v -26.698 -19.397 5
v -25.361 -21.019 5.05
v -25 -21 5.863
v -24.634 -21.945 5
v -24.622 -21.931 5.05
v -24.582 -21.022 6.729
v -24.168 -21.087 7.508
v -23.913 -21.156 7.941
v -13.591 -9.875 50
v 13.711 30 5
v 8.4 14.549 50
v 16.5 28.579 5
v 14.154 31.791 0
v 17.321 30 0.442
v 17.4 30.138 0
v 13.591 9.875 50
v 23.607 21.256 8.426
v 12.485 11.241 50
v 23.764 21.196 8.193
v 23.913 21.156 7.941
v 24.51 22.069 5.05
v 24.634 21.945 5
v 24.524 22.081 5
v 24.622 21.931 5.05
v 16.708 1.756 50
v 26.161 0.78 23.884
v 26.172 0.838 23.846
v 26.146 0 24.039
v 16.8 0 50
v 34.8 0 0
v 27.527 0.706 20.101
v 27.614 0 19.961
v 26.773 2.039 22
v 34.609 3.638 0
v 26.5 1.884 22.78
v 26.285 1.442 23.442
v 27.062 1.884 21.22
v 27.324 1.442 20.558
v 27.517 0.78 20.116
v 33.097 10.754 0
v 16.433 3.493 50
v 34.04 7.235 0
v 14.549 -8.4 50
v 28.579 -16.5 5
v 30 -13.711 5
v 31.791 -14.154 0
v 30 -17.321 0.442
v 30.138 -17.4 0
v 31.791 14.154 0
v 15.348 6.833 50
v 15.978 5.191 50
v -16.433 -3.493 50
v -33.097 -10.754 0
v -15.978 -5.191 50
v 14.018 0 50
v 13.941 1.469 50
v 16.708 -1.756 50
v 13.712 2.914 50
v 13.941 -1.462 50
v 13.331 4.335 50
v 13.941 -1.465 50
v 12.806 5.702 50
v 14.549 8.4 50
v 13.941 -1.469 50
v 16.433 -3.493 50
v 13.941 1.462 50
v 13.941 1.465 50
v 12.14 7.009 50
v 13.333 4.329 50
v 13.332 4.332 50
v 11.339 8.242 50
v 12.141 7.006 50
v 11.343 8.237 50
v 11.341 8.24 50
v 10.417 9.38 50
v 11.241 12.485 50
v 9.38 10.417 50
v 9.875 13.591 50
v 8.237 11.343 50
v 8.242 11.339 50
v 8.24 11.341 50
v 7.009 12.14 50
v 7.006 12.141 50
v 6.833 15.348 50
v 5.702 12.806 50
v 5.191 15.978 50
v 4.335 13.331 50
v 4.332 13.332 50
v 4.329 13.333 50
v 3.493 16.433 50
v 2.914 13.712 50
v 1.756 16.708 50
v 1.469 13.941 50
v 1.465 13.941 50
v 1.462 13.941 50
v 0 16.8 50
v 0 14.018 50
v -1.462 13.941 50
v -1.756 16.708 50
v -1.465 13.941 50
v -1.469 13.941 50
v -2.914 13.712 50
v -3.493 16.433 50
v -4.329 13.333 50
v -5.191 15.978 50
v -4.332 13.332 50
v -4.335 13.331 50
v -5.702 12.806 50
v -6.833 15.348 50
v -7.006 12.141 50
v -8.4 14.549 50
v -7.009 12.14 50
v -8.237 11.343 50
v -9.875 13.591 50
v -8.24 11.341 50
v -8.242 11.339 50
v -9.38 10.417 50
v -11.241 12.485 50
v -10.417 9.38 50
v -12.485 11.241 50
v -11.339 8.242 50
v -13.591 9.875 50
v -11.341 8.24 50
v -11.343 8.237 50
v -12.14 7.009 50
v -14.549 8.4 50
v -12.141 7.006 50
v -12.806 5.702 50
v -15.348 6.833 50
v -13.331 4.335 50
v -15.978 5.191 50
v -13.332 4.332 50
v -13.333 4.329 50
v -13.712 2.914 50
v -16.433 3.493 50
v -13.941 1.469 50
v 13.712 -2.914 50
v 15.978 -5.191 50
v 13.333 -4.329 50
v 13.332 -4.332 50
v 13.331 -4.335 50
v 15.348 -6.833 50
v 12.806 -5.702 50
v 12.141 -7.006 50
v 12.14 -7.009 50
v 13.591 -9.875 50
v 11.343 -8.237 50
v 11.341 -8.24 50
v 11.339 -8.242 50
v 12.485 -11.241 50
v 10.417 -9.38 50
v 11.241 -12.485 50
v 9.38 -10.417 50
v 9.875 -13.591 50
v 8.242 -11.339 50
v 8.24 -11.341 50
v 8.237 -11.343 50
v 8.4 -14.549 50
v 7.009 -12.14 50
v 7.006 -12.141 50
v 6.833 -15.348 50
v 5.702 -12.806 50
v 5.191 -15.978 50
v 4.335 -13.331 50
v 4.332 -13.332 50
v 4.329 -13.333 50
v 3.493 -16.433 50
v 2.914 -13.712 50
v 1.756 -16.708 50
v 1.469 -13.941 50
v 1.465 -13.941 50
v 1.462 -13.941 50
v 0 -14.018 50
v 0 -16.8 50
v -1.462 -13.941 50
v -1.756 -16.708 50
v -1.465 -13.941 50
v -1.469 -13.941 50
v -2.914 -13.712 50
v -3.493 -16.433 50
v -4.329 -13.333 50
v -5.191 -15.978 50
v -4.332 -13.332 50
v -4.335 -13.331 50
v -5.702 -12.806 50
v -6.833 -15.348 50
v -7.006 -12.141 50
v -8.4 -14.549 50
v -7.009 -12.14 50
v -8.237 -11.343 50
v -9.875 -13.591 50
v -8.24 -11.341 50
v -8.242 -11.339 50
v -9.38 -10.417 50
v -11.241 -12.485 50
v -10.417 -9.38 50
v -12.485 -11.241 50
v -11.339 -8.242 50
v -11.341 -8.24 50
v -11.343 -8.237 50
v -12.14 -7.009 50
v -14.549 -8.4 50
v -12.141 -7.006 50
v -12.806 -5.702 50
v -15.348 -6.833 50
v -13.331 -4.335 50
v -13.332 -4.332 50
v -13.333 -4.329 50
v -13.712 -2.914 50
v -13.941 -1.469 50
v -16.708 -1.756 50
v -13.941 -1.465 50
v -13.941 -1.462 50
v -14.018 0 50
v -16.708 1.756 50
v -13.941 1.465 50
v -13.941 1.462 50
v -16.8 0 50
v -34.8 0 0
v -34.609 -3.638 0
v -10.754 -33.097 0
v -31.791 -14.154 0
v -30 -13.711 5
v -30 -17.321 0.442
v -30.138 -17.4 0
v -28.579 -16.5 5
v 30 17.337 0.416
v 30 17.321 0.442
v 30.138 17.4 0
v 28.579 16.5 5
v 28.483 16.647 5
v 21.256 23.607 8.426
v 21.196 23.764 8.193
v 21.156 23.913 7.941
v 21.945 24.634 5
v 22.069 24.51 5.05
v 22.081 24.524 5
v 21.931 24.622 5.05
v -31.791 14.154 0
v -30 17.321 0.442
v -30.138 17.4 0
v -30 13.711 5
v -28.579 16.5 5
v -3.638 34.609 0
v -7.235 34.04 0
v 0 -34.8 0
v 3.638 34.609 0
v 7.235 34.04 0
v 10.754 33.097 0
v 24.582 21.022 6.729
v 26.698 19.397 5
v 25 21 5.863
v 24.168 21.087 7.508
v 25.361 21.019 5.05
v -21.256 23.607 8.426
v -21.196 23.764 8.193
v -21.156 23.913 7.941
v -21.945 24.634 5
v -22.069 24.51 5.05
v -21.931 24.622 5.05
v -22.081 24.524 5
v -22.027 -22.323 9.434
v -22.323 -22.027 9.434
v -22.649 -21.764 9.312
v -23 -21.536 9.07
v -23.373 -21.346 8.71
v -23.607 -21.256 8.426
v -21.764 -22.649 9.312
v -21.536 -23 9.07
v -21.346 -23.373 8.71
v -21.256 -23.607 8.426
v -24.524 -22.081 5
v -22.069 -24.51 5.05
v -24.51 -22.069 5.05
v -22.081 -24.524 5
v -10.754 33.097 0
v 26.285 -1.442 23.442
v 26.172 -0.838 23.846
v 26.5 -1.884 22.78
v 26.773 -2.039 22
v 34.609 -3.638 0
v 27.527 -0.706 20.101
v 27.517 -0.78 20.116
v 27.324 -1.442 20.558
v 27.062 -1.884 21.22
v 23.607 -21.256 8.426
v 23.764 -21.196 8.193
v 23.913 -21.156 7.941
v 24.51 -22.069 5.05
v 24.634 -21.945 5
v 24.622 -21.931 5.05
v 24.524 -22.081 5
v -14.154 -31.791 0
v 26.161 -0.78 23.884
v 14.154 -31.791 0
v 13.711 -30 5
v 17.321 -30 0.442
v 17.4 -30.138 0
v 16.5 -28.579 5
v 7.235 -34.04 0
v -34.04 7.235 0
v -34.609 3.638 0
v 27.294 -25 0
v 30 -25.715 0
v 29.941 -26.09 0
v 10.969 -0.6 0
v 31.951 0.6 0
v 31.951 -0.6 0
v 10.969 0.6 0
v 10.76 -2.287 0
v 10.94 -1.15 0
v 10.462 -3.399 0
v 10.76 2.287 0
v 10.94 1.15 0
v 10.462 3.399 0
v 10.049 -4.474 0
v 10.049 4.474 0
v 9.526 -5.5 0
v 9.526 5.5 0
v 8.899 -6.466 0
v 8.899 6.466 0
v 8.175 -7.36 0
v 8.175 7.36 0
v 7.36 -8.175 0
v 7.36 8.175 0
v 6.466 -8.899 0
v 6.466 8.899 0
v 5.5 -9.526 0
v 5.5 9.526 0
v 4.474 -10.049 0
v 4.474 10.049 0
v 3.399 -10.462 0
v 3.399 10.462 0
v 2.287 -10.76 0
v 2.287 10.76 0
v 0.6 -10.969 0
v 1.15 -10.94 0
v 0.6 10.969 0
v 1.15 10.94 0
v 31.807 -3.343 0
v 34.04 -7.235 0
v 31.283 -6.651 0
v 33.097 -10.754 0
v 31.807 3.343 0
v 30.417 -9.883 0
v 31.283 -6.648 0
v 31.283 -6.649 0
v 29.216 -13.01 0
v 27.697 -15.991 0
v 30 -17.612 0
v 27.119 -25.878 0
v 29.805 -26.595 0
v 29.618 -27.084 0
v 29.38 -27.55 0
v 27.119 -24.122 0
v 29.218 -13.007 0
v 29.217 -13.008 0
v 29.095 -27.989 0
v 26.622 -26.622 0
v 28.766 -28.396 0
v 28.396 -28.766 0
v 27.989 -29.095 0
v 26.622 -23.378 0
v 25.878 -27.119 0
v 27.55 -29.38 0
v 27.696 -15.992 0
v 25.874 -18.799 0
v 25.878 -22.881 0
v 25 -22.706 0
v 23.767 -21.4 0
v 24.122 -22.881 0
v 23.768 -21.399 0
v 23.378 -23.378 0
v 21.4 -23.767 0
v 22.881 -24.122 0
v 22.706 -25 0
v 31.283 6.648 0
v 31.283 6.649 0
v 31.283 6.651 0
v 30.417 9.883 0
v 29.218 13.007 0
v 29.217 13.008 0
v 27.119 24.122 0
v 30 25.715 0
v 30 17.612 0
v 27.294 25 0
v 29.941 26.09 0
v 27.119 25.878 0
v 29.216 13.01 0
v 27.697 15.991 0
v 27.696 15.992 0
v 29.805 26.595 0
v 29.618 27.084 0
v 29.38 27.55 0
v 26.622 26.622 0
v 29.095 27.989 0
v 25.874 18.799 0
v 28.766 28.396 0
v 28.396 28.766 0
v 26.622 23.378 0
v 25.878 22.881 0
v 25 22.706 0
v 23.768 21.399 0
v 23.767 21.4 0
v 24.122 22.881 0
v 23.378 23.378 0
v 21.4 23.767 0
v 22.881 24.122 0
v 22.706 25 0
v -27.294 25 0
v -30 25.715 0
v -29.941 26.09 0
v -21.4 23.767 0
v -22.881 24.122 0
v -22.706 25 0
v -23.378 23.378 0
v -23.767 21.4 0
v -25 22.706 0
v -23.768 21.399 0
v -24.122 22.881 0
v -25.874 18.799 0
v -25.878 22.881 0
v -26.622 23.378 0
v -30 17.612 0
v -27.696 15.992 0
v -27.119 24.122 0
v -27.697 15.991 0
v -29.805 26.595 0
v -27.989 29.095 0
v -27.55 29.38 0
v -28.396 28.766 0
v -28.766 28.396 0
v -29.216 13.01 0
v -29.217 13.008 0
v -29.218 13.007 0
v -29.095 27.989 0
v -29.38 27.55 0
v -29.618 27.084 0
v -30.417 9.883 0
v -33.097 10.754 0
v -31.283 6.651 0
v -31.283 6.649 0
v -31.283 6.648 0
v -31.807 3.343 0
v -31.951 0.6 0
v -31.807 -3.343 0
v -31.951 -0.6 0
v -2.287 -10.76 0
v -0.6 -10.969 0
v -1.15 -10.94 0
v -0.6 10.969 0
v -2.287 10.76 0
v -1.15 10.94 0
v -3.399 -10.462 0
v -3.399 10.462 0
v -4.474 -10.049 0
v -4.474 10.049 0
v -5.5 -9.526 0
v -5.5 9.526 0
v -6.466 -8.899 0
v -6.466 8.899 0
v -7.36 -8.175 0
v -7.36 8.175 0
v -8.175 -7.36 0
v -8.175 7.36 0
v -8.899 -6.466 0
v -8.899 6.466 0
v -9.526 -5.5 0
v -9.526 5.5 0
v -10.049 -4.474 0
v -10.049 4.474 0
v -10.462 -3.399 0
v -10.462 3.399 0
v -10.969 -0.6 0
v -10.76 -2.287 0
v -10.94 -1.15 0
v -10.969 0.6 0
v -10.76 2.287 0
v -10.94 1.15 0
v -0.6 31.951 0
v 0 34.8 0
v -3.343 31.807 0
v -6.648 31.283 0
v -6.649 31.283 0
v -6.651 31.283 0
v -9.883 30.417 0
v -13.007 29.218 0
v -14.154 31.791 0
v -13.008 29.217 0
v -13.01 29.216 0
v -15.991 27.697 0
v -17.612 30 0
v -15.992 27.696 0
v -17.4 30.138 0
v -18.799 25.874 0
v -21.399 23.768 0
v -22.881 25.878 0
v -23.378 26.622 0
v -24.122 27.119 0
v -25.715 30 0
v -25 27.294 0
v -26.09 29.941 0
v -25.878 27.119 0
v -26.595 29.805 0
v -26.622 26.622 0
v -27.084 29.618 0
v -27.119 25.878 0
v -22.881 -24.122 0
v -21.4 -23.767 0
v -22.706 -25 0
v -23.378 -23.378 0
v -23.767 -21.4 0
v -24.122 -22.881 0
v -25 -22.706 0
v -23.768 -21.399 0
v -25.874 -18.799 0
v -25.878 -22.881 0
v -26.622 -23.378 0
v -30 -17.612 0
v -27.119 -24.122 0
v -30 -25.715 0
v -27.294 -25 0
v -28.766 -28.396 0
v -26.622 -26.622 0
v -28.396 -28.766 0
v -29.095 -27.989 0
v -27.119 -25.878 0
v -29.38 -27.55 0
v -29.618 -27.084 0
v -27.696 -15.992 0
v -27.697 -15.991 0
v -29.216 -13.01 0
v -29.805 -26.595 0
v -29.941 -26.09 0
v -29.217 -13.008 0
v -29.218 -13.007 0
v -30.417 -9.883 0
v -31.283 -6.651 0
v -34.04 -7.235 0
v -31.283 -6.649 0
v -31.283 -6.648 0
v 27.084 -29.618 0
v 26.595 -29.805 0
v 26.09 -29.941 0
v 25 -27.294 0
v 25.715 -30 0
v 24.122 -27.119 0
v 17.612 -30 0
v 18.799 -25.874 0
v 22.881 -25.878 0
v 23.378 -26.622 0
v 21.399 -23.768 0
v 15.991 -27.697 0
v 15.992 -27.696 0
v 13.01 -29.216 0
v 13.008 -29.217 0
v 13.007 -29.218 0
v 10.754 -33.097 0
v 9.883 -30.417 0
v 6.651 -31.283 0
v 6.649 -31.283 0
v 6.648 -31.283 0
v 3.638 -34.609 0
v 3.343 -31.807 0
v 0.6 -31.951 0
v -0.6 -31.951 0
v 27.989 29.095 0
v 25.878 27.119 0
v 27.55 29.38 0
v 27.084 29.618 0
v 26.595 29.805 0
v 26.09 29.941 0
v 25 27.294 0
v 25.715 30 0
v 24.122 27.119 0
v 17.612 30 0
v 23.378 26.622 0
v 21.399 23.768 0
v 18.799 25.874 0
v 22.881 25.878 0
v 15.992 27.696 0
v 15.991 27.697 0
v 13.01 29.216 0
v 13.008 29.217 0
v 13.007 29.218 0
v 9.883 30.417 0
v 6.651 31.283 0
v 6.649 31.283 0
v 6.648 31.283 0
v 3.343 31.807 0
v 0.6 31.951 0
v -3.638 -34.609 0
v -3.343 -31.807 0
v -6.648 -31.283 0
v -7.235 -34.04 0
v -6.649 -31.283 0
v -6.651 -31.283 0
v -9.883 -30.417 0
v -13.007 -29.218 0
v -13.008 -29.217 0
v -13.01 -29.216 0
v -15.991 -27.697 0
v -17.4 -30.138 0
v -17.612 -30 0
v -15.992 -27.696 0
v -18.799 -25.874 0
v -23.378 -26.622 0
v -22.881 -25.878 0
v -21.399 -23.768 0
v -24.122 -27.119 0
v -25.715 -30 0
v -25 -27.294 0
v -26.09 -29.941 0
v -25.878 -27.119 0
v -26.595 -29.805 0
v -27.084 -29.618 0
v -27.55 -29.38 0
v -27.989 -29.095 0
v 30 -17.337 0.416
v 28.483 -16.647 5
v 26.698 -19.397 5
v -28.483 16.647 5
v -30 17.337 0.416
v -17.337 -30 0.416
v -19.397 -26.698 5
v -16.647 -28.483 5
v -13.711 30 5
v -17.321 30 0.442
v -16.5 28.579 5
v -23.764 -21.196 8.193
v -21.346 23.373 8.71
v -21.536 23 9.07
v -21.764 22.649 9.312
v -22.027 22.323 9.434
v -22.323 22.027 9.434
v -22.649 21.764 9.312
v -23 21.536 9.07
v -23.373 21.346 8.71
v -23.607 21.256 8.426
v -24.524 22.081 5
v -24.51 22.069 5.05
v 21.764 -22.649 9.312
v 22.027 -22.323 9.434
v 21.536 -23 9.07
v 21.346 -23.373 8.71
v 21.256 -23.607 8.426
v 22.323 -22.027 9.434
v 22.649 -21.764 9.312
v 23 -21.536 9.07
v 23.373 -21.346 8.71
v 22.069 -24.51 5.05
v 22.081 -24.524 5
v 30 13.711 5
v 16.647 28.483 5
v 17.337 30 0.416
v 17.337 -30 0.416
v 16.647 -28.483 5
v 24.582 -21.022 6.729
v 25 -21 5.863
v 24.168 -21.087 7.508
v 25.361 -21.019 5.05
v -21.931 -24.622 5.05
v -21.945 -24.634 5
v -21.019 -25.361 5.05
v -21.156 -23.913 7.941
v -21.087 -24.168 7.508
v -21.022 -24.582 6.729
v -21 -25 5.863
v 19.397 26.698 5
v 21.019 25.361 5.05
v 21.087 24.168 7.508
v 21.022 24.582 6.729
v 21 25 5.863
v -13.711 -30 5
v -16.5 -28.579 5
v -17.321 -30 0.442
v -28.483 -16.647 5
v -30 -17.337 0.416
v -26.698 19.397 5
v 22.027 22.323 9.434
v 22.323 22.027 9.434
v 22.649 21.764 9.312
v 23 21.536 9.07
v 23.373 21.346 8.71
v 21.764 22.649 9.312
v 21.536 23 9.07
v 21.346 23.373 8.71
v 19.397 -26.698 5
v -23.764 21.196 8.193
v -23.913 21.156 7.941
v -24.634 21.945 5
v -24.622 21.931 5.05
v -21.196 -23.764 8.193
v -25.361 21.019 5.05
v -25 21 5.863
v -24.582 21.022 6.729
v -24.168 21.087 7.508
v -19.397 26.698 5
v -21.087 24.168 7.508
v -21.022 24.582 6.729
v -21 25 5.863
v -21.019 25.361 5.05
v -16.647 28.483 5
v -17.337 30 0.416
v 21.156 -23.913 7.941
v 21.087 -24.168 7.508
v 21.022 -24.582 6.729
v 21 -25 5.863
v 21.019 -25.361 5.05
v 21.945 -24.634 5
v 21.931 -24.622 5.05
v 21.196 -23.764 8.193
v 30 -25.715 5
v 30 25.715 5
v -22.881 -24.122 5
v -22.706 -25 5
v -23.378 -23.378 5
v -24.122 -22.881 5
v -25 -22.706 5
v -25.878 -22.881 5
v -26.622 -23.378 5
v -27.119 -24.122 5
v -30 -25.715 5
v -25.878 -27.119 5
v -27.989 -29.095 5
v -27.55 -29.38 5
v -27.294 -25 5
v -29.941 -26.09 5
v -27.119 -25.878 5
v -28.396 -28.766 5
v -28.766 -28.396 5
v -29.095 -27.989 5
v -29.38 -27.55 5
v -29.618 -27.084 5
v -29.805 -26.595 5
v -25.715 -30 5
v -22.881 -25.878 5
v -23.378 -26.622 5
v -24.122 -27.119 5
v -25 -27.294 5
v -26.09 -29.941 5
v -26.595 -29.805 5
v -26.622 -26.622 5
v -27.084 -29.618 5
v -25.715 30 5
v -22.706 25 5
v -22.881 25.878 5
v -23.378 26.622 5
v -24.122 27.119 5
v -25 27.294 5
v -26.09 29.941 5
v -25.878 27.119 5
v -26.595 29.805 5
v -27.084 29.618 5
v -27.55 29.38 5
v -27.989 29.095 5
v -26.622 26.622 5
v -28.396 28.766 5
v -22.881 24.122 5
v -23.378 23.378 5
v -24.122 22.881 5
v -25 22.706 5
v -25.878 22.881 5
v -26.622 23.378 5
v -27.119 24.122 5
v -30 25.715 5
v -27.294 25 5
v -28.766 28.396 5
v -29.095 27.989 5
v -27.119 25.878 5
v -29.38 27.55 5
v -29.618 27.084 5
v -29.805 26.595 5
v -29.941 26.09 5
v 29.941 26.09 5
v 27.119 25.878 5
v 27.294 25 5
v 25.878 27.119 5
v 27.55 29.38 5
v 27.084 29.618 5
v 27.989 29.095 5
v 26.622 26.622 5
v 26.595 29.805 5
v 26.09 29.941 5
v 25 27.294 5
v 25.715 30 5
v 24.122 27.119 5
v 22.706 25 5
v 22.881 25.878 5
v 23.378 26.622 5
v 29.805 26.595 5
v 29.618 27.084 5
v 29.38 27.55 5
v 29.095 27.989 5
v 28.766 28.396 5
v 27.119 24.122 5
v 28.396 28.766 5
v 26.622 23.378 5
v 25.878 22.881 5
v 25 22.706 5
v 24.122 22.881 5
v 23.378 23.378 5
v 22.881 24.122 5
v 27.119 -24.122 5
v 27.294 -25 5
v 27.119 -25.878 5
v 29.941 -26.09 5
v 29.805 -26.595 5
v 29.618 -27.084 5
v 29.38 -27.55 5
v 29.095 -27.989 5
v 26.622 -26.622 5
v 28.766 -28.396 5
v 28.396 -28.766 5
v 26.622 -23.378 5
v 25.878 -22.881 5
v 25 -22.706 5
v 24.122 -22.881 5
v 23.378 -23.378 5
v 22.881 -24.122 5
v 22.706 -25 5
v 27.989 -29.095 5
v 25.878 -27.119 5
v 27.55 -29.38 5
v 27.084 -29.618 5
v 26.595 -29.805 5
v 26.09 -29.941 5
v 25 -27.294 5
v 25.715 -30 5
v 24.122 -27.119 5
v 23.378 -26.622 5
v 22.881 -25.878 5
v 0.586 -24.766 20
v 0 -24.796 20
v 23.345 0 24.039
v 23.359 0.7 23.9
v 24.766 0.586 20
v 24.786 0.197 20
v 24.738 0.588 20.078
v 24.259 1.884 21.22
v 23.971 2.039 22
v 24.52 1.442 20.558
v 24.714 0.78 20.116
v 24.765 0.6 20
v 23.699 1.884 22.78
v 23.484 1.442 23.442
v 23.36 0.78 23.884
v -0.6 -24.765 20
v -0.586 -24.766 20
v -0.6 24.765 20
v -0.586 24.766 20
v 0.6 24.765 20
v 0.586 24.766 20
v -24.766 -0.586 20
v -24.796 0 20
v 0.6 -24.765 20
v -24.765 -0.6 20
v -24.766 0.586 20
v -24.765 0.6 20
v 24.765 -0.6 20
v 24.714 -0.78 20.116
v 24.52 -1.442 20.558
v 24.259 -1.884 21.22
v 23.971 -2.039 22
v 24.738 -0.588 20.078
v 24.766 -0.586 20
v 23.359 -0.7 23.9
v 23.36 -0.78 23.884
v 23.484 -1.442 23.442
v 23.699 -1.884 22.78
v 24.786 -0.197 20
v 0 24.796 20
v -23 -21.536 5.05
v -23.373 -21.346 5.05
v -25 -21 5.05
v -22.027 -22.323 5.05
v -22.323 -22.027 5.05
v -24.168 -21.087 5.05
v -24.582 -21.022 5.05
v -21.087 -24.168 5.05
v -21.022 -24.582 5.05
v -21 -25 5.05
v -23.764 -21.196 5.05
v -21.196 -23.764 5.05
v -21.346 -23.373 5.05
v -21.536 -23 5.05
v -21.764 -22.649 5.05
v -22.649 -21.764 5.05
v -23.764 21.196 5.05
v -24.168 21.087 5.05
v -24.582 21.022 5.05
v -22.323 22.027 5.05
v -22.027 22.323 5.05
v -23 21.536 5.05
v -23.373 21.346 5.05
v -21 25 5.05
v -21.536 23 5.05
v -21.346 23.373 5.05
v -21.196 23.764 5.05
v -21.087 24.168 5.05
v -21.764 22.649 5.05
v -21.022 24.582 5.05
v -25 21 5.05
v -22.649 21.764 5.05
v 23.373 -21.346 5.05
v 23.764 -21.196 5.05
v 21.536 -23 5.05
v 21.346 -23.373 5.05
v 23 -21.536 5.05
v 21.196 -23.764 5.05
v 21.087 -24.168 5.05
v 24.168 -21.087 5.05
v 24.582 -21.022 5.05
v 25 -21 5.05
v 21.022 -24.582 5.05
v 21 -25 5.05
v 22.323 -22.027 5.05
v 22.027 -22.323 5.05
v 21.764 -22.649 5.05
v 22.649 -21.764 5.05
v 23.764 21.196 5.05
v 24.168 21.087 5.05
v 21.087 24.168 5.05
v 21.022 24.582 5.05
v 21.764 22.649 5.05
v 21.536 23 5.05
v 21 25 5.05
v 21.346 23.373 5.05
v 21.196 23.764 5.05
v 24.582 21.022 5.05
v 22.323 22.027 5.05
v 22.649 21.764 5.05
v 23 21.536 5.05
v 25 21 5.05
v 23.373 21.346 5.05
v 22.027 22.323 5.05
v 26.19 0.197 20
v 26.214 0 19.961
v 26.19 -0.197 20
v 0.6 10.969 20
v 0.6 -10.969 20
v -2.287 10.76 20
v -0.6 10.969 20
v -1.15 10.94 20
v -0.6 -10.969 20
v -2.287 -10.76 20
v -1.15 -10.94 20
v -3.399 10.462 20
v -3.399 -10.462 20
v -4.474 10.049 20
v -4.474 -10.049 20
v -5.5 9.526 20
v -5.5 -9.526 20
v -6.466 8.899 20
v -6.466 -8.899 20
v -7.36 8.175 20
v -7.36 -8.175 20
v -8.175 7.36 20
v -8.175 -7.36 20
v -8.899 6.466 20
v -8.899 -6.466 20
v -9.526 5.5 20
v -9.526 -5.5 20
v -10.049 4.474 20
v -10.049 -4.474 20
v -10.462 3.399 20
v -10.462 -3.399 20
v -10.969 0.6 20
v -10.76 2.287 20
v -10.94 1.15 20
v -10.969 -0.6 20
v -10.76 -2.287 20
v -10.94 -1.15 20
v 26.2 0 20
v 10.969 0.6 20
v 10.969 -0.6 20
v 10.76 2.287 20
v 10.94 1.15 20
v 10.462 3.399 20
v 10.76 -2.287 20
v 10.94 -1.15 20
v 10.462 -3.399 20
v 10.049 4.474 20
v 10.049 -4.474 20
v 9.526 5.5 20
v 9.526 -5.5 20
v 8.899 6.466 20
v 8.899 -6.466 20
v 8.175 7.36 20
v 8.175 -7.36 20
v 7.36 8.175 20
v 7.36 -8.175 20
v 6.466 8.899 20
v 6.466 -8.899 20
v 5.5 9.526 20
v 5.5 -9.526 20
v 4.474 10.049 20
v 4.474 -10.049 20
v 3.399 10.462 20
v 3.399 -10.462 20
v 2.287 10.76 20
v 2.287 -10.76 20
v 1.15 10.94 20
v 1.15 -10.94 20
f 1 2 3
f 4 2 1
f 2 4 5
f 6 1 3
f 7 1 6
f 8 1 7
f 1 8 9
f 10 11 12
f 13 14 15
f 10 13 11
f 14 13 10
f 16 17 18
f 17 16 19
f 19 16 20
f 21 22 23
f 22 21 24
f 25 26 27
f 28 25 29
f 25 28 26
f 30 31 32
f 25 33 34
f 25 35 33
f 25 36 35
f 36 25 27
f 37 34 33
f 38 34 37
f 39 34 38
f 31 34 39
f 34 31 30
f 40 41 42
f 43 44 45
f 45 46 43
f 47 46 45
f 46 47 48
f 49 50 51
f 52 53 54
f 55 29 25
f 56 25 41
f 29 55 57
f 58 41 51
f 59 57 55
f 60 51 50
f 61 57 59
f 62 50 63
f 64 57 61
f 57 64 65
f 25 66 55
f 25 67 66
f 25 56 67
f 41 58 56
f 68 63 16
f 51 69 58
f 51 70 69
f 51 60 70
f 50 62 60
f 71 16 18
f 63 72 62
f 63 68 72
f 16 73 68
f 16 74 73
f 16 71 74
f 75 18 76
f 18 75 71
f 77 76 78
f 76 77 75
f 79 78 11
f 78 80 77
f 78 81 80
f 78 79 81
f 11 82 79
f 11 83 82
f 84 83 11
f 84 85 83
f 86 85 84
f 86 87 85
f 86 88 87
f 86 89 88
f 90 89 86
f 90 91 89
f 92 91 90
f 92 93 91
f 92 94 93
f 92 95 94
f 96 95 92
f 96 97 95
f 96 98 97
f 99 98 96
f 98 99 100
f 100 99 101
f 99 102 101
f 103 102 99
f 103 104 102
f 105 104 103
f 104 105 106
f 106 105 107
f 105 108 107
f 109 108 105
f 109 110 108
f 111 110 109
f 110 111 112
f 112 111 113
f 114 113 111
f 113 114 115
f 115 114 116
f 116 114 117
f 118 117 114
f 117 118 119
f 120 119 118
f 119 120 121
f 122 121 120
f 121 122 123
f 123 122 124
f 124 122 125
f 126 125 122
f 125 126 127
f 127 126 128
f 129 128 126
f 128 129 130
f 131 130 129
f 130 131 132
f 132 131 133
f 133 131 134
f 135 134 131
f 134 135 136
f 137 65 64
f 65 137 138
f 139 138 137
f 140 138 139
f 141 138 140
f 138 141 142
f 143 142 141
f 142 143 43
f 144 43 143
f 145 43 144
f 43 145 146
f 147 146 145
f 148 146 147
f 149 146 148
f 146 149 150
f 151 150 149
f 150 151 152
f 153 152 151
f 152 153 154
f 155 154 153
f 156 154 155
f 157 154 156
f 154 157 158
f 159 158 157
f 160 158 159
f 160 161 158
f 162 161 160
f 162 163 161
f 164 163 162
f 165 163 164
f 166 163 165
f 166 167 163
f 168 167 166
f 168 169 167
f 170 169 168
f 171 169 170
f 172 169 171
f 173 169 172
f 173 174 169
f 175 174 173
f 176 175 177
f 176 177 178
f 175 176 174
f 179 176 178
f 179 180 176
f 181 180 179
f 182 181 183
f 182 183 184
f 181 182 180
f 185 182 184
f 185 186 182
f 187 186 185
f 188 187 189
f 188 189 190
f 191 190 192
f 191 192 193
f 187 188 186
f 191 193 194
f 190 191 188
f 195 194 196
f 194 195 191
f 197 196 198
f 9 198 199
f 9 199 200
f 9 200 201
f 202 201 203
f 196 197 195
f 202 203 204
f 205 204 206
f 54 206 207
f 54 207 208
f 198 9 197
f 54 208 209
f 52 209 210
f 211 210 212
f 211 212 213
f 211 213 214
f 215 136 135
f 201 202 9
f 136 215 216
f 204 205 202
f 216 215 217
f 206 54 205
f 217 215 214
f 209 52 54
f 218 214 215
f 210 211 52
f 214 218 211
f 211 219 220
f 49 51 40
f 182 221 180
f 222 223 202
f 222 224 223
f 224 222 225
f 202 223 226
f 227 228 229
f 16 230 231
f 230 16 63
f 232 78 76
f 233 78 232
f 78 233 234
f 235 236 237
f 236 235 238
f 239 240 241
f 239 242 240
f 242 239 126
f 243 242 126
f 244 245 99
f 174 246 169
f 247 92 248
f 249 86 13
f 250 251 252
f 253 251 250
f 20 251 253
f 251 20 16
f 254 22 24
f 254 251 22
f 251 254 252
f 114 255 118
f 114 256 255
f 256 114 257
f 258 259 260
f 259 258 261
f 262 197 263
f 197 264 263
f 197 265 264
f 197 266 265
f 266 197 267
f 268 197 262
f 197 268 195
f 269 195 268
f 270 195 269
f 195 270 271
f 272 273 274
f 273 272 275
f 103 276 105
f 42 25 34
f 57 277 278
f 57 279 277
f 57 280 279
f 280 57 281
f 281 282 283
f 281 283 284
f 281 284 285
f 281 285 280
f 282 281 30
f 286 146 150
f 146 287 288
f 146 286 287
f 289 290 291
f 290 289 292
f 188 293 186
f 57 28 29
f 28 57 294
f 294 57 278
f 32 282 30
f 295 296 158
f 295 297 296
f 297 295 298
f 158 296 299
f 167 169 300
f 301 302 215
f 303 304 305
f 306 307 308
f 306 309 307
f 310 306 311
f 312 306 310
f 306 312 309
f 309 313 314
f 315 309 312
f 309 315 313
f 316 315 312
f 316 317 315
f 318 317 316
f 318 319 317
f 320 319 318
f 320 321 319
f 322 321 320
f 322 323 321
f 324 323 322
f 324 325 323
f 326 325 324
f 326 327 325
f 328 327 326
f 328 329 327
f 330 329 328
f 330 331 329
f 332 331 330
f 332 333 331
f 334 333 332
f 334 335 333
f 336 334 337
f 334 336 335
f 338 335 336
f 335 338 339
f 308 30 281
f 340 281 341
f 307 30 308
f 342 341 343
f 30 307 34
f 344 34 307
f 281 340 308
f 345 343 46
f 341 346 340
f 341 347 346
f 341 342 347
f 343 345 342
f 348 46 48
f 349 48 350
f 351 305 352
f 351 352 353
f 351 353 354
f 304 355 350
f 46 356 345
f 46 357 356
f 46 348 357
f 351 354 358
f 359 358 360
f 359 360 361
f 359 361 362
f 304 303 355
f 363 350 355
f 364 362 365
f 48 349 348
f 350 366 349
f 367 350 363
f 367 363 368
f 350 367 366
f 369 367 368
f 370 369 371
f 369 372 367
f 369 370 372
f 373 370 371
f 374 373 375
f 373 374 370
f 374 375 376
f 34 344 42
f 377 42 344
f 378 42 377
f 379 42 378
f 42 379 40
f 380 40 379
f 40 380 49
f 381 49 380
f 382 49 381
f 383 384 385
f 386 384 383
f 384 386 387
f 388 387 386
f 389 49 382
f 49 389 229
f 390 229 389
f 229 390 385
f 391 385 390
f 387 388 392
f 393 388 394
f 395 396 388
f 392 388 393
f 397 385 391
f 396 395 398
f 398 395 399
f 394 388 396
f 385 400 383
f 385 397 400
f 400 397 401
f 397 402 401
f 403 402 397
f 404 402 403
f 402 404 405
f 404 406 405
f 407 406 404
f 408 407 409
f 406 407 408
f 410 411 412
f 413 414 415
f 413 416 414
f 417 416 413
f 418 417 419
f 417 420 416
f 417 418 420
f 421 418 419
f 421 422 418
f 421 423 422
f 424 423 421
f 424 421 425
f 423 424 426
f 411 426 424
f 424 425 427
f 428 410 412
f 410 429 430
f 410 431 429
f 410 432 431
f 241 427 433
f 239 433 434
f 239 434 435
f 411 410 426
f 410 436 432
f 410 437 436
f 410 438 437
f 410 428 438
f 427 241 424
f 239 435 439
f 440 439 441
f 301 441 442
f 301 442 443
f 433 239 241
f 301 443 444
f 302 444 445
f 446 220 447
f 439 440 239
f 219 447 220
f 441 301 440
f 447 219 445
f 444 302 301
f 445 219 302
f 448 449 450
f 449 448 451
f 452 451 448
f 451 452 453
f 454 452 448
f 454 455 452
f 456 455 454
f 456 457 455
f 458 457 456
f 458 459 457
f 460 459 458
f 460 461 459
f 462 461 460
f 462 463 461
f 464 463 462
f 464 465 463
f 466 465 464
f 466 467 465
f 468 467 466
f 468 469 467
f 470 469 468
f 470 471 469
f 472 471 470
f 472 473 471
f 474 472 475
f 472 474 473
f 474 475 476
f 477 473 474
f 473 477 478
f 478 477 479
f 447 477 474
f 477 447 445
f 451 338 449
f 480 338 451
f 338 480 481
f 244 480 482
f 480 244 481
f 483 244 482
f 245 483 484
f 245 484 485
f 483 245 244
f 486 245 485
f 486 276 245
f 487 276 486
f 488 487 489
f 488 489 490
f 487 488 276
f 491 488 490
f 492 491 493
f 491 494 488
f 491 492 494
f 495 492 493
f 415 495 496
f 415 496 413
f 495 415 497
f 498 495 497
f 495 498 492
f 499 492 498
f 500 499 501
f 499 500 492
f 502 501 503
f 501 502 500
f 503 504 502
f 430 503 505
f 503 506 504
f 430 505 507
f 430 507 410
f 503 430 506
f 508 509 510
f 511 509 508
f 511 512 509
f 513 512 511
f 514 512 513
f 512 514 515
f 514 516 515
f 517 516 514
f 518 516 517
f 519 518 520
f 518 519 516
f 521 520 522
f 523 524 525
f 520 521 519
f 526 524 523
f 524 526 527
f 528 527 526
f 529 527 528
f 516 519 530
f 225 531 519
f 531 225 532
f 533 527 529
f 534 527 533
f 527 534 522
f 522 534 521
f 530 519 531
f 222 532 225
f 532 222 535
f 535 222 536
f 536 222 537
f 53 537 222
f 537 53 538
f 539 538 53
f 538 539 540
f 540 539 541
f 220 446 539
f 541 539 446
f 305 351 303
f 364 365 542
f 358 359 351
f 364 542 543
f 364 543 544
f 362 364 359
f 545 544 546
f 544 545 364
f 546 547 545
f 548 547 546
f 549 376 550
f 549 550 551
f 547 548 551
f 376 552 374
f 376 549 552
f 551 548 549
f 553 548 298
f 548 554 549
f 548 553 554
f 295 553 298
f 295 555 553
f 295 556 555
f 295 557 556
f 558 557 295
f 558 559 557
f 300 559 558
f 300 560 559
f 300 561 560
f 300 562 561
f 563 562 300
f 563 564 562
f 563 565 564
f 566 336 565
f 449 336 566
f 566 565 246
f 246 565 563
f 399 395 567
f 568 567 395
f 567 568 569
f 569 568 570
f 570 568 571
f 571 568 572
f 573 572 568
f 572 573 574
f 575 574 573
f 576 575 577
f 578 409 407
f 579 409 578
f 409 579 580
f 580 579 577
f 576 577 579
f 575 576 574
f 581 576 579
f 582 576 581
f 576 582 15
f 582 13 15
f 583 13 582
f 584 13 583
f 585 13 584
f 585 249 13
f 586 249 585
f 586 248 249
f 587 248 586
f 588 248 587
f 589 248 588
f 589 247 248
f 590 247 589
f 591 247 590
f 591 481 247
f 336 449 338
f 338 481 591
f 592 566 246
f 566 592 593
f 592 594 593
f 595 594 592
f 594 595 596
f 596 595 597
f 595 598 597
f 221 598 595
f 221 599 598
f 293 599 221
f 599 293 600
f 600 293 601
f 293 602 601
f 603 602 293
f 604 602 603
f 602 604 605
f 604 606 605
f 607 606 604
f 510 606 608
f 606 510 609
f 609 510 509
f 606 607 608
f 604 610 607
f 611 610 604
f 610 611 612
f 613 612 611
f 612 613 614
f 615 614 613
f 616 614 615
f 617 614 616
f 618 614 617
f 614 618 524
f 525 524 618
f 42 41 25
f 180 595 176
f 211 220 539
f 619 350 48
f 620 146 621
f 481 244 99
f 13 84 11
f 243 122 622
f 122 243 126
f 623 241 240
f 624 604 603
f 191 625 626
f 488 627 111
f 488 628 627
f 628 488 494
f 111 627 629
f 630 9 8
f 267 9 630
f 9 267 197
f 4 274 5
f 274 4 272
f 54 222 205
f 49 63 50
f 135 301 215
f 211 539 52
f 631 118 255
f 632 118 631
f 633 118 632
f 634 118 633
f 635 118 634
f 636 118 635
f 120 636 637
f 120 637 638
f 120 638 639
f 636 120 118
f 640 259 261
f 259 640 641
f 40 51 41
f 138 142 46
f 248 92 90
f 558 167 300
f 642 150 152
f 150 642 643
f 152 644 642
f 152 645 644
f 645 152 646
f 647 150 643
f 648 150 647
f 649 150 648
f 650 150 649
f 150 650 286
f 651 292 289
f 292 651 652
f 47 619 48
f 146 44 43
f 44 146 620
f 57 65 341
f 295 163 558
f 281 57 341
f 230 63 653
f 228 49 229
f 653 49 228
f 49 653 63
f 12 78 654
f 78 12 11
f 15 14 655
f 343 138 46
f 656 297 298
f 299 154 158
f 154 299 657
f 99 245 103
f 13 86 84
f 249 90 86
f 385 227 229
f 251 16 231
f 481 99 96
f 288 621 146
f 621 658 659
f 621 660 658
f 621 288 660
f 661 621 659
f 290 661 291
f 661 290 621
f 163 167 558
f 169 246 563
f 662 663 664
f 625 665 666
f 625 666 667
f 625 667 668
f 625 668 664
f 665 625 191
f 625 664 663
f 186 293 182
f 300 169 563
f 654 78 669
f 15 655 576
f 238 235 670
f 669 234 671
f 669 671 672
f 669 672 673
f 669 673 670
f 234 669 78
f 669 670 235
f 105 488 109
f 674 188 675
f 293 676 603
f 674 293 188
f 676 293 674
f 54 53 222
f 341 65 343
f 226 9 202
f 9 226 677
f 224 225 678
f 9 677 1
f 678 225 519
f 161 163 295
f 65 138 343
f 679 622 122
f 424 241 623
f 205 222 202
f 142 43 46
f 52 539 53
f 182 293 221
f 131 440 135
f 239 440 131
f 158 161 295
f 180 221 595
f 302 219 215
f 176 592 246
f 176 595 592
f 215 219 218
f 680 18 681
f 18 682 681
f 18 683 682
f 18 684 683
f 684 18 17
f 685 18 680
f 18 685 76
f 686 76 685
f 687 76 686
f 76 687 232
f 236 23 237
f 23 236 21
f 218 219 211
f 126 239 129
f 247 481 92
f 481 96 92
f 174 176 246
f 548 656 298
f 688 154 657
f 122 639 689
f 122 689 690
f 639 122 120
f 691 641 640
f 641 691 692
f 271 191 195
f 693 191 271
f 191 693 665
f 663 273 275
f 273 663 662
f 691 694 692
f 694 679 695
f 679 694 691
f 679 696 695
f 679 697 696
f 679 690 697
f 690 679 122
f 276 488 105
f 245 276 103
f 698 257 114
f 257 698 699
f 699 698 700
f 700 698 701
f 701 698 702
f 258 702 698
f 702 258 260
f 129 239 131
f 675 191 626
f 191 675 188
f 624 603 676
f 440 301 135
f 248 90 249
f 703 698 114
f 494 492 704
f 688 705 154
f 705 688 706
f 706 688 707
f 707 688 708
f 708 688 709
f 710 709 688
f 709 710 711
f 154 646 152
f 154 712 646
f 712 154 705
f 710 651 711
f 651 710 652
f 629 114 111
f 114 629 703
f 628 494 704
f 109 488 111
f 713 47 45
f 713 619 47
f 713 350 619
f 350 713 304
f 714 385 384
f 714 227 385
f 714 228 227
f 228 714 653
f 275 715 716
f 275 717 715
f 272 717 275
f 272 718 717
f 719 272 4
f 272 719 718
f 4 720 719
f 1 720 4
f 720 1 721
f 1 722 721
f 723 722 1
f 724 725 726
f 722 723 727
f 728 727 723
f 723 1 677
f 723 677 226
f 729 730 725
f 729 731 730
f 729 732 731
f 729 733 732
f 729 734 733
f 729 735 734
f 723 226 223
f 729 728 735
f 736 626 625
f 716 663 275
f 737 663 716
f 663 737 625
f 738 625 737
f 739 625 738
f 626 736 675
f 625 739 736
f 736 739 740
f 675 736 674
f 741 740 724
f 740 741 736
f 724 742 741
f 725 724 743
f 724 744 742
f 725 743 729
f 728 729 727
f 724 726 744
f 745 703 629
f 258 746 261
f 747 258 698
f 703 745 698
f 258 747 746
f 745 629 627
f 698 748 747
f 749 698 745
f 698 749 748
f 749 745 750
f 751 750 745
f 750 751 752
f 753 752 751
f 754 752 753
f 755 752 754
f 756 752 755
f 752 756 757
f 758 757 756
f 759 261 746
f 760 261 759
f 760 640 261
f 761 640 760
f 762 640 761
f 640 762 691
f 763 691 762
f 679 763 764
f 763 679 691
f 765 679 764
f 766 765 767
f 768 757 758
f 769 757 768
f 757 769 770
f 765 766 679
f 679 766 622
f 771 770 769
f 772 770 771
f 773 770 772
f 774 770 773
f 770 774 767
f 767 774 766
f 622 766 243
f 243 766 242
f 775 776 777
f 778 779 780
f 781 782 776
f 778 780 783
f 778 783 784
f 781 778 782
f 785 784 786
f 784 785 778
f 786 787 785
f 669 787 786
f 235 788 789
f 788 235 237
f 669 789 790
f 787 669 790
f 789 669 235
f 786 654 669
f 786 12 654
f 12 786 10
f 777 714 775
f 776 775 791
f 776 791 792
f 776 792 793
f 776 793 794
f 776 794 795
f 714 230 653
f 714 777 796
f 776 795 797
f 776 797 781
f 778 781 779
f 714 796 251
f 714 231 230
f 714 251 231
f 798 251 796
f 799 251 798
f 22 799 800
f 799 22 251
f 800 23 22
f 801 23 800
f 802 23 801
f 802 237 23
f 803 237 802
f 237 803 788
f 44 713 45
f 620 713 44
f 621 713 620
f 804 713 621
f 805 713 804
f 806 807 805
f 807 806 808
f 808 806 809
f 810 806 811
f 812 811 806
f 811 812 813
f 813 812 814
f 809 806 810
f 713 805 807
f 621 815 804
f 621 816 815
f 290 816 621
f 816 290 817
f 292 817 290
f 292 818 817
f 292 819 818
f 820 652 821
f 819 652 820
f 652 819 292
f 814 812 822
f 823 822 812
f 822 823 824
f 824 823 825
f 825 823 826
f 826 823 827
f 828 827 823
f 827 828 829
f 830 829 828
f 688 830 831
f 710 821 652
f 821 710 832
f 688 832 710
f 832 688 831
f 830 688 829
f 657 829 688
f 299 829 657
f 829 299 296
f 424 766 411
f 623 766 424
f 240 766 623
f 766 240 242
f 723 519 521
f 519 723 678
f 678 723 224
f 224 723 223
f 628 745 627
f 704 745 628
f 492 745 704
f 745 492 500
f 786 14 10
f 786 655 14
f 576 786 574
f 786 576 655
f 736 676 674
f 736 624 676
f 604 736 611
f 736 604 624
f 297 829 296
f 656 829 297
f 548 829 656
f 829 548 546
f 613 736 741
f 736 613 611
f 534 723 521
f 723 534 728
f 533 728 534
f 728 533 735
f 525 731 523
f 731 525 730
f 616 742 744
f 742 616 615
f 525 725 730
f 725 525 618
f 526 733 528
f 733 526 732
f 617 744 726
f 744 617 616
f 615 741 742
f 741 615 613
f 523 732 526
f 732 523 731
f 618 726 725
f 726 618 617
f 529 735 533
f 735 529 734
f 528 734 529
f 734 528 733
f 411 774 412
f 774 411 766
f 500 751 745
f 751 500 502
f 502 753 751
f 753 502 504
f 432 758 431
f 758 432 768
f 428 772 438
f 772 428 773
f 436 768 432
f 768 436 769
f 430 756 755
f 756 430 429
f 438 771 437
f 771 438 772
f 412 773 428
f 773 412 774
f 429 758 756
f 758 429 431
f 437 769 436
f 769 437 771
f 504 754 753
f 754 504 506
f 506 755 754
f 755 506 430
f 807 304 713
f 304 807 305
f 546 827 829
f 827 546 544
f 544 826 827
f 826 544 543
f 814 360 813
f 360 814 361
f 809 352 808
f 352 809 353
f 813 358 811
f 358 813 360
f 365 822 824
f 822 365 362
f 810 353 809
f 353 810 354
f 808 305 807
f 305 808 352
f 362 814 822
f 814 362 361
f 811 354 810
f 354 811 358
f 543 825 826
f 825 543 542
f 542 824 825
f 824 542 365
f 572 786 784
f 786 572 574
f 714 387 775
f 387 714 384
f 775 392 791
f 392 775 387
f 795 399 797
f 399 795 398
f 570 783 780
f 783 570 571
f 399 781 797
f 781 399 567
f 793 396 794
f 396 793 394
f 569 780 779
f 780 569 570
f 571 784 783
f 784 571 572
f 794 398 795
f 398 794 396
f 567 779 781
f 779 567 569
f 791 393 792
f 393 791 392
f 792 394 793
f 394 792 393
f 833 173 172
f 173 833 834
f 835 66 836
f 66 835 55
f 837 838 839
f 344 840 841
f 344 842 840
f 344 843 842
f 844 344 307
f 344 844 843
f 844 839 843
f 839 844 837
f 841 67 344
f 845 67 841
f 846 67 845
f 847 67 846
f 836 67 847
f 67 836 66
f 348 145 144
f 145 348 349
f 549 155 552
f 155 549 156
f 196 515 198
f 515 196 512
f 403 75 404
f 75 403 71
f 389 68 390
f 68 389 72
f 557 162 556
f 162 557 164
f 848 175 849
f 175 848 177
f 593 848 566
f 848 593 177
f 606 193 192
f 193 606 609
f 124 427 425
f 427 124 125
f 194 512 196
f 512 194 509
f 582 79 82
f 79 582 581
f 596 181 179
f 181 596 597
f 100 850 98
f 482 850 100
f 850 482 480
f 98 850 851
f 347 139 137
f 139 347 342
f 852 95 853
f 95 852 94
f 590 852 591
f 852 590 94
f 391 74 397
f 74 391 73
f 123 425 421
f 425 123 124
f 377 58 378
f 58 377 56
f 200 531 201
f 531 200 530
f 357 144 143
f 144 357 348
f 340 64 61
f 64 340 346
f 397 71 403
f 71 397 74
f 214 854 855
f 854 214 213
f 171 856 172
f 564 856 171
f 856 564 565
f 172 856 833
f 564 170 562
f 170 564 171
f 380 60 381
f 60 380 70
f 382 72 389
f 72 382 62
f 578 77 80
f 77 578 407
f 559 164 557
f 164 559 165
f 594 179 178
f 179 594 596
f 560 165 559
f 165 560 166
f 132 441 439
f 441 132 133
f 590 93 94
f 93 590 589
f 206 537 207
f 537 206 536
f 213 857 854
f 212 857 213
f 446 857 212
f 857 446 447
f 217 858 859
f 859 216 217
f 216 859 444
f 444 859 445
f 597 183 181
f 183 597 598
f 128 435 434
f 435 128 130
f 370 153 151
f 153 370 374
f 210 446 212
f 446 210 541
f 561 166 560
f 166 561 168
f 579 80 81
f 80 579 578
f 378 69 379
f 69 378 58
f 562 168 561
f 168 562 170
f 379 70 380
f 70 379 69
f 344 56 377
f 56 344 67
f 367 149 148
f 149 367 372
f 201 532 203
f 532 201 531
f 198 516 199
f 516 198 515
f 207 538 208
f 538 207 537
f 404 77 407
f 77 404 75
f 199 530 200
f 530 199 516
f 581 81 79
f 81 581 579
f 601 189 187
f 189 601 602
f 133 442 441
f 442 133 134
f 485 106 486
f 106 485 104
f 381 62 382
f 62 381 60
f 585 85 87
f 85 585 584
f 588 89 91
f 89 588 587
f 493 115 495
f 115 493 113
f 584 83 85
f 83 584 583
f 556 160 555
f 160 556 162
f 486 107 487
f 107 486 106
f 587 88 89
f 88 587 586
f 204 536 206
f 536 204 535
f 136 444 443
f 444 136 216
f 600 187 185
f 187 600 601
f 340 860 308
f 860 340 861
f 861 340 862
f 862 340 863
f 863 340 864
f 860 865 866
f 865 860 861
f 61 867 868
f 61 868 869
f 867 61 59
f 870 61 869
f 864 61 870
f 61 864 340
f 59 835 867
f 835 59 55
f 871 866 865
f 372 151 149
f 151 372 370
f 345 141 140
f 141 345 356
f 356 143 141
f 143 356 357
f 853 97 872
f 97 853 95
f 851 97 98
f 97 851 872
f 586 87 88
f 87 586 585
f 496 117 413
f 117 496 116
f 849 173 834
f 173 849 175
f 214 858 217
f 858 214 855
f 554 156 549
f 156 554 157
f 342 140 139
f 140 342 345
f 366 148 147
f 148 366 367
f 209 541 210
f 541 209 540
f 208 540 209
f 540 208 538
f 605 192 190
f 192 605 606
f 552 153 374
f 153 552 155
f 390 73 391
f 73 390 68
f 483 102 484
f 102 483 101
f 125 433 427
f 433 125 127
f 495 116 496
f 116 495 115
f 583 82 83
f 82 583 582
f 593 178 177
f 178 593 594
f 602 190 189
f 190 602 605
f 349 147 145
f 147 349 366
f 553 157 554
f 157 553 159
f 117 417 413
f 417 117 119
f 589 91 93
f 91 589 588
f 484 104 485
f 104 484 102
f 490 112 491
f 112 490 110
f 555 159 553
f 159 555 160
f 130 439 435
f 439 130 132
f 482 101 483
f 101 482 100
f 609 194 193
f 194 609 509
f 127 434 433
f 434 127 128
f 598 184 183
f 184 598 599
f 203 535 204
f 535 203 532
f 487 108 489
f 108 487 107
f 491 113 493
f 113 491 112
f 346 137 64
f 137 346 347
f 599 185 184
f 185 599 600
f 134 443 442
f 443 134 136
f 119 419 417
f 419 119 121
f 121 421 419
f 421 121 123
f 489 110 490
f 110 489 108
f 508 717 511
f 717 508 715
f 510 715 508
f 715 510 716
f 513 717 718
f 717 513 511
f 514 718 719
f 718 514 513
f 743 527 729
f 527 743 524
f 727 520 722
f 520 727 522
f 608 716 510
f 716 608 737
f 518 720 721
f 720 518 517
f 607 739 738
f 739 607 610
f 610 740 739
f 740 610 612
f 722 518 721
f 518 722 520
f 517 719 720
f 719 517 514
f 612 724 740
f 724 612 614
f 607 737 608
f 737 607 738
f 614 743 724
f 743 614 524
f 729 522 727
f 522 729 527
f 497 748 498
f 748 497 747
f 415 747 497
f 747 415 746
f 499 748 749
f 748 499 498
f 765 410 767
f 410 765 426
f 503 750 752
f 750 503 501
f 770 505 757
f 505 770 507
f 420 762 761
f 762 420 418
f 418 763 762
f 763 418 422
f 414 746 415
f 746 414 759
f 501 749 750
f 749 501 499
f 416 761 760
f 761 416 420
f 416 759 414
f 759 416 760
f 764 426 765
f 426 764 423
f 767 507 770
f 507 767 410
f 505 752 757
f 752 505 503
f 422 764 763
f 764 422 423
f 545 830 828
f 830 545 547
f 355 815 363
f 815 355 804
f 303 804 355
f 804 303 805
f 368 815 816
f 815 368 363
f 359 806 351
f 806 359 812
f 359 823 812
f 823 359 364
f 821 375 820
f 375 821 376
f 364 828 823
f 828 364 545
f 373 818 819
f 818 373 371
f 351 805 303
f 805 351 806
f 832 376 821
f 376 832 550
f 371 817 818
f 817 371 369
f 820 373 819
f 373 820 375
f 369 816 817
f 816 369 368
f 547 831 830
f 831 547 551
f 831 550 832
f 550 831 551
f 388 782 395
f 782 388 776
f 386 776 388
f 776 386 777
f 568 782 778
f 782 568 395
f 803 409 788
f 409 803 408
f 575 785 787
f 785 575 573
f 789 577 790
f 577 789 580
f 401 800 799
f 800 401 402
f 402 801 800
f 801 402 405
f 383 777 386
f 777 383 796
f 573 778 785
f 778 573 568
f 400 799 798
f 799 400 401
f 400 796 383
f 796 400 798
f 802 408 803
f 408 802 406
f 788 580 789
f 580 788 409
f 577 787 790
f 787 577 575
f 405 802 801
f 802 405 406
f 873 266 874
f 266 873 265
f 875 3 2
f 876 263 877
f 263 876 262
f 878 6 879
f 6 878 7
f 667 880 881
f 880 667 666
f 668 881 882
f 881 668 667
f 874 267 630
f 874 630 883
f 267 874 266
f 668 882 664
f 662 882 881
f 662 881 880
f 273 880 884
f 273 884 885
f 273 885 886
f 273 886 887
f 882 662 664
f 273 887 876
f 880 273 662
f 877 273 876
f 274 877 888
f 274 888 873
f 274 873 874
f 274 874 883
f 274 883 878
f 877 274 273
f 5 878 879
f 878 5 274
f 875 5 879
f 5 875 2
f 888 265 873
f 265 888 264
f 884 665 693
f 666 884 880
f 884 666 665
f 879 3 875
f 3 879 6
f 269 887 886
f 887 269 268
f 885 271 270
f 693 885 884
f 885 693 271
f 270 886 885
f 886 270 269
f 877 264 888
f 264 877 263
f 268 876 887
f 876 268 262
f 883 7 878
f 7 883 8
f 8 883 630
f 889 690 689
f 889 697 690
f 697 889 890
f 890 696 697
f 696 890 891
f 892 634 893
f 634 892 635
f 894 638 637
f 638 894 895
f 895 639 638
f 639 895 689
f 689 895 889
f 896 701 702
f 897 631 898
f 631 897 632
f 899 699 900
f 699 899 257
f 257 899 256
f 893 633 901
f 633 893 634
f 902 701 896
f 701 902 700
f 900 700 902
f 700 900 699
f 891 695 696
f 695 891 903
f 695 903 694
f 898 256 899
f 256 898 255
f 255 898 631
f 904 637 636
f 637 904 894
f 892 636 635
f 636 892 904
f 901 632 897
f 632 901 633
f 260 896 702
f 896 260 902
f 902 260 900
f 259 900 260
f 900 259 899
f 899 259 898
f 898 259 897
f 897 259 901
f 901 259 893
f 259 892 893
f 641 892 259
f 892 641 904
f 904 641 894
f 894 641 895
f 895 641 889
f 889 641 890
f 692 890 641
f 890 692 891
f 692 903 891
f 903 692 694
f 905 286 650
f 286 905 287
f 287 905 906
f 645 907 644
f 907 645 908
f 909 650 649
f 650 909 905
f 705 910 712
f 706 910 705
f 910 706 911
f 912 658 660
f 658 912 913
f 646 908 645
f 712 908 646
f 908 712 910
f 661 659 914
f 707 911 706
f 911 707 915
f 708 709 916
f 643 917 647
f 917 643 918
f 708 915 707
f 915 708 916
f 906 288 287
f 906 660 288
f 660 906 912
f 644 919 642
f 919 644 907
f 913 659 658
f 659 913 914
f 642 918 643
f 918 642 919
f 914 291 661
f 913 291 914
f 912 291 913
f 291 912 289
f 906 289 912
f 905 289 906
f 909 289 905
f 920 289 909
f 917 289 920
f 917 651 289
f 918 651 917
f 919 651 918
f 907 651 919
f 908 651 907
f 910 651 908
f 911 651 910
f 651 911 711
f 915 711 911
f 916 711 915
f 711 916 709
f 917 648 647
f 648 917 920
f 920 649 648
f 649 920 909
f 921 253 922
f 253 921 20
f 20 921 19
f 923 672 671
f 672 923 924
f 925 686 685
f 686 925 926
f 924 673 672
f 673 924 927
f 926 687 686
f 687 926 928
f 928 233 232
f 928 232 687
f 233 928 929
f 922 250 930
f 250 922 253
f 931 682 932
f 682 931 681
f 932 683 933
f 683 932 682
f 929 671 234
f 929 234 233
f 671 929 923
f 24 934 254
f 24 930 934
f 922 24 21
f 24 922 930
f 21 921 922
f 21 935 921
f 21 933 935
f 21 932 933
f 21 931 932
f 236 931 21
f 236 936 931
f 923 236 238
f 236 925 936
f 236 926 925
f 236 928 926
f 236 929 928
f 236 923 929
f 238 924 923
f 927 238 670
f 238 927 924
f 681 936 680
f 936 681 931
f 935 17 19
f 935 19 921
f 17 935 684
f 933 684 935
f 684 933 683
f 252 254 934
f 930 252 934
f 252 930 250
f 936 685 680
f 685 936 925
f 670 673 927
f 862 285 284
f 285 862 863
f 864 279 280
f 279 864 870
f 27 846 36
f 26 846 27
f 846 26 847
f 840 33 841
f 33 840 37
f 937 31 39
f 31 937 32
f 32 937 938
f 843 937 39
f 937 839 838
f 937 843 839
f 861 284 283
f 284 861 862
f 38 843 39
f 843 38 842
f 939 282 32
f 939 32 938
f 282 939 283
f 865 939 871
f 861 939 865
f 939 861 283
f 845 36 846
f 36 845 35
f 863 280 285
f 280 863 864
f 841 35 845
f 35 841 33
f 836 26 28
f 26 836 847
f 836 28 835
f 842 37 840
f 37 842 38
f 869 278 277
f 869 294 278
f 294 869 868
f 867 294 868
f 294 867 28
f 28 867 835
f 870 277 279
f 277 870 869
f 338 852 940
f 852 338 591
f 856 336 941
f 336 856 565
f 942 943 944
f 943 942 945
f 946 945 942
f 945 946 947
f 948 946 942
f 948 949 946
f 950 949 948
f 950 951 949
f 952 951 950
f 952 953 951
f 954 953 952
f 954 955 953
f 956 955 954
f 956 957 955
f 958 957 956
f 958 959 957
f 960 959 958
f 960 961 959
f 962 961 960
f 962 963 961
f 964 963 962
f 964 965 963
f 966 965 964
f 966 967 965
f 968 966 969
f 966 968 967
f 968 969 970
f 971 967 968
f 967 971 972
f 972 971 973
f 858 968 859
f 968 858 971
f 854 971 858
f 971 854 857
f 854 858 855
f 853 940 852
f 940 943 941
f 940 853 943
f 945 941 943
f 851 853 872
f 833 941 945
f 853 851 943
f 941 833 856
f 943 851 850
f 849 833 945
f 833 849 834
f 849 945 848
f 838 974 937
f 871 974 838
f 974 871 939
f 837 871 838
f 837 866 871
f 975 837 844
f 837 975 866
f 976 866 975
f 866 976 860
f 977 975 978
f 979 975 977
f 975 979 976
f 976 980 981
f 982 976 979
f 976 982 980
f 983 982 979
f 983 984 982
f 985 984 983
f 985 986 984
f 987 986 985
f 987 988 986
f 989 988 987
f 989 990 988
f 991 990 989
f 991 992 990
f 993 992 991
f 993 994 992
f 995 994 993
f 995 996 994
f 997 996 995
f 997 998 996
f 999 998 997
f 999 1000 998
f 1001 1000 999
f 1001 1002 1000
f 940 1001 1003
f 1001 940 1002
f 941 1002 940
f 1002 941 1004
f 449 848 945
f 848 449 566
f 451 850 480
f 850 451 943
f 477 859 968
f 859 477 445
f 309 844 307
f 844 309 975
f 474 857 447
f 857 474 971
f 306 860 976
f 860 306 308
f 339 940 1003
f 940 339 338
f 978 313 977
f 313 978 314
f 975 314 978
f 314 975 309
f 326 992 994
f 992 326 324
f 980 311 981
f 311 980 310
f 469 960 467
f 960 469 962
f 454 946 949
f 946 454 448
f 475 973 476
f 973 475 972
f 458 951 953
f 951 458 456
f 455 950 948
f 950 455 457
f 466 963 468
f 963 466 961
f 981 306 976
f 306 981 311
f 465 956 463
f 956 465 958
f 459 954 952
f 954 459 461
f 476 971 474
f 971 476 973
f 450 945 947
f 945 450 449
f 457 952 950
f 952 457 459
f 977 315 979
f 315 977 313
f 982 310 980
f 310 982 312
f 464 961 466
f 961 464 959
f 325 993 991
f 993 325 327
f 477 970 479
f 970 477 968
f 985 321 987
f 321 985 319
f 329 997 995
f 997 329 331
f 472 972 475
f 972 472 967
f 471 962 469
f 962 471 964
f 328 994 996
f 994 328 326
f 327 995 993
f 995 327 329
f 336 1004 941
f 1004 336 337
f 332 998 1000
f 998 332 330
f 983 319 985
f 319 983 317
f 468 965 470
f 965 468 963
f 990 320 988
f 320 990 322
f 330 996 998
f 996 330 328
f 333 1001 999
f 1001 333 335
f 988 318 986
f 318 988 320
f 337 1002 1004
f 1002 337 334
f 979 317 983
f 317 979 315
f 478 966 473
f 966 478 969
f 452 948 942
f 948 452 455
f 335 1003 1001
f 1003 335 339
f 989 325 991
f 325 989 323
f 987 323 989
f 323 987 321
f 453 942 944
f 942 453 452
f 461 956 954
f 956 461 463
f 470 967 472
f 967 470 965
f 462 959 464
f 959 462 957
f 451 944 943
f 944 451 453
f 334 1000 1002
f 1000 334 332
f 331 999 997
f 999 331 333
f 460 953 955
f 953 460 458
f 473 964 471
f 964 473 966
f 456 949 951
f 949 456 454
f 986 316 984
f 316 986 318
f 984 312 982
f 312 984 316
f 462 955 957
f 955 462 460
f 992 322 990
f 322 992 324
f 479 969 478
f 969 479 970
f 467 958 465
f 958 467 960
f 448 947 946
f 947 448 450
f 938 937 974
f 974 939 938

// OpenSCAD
sensorheight = 20;
sensorwidthbase = 22;
sensorwidthtop = 22;

basewidth = 60;
drilldist = 50;
baseheight = 5;
holedepth = baseheight;

wallwidth = 1.2;

// düsenparameter
height = 50;
openinginner = 28;
tubeinner = 64;
tubewidth = 2.8;

wirewidth = 4;

$fn=60;

module cylinder_outer(height,d){
   fn=16;
   fudge = 1/cos(180/fn);
   cylinder(h=height,r=d/2*fudge,$fn=fn);}

module round_corner_ex(height, rad) {
    translate([-rad,-rad,0])
    difference() {
        cube([rad,rad, height]);
        translate([0,0,-0.1]) cylinder(h=height+0.2, d=2*rad);
    }
}


difference() {
    union() {
        // Düse außen
        cylinder(h=height,d1=tubeinner+2*tubewidth,d2=openinginner+2*tubewidth);
        // Grundplatte
        translate([-basewidth/2,-basewidth/2,0]) cube([basewidth,basewidth,baseheight]);
    }
        
    // Düse innen abziehen
    translate([0,0,-0.05]) cylinder(h=height+0.1,d1=tubeinner,d2=openinginner);

    // Bohrungen abziehen
    translate([-drilldist/2,-drilldist/2,-0.1]) cylinder_outer(holedepth+0.2,4.5);
    translate([-drilldist/2,drilldist/2,-0.1]) cylinder_outer(holedepth+0.2,4.5);
    translate([drilldist/2,-drilldist/2,-0.1]) cylinder_outer(holedepth+0.2,4.5);
    translate([drilldist/2,drilldist/2,-0.1]) cylinder_outer(holedepth+0.2,4.5);

    // Platz für Schraubenkopf abziehen
    translate([-drilldist/2, -drilldist/2, baseheight+0.05]) cylinder(h=5, d1=8,d=8);
    translate([-drilldist/2, drilldist/2, baseheight+0.05]) cylinder(h=5, d1=8,d=8);
    translate([drilldist/2, -drilldist/2, baseheight+0.05]) cylinder(h=5, d1=8,d=8);
    translate([drilldist/2, drilldist/2, baseheight+0.05]) cylinder(h=5, d1=8,d=8);

    
    // Kabeldurchführung abziehen
    translate([0,0,sensorheight+wirewidth/2]) rotate([0,90,0]) cylinder_outer(50,wirewidth);
    
    // Ecken abrunden
     translate([-basewidth/2-0.05, -basewidth/2-0.05, -0.1]) rotate([0,0,180]) round_corner_ex(baseheight+0.2, 5);
    translate([-basewidth/2-0.05, basewidth/2+0.05, -0.1]) rotate([0,0,90]) round_corner_ex(baseheight+0.2, 5);
    translate([basewidth/2+0.05, -basewidth/2-0.05, -0.1]) rotate([0,0,270]) round_corner_ex(baseheight+0.2, 5);
    translate([basewidth/2+0.05, basewidth/2+0.05, -0.1]) rotate([0,0,0]) round_corner_ex(baseheight+0.2, 5);

}

// sensorplatform und strömungsdirektor
intersection() {
    union() {
        // Wände als Halterung des Podests
        translate([-wallwidth/2,-tubeinner/2,0]) cube([wallwidth, tubeinner,sensorheight]);
        translate([-tubeinner/2,-wallwidth/2,0]) cube([tubeinner,wallwidth, sensorheight]);
 
        // Sensorpodest
        cylinder(h=sensorheight,d1=sensorwidthbase, d2=sensorwidthtop);
    }
    // mit Düse Innen schneiden
    cylinder(h=height,d1=tubeinner+tubewidth,d2=openinginner+tubewidth);
}

// zur Kontrolle die Kegel des Sensor-Sichtbereichs
// licht emitter
%color("red",0.3) translate([1,0,sensorheight+1]) cylinder(h=50,d1=0,r2=sin(35)*50);
// licht collector
%color("blue",0.3) translate([-2,0,sensorheight+1]) cylinder(h=60,d1=0,r2=sin(25)*60);

// Schraubenkopf
%color("red", 0.3) translate([-drilldist/2, -drilldist/2, baseheight]) cylinder(h=2.6, d1=7,d=7);
%color("red", 0.3) translate([drilldist/2, -drilldist/2, baseheight]) cylinder(h=2.6, d1=7,d=7);
%color("red", 0.3) translate([-drilldist/2, drilldist/2, baseheight]) cylinder(h=2.6, d1=7,d=7);
%color("red", 0.3) translate([drilldist/2, drilldist/2, baseheight]) cylinder(h=2.6, d1=7,d=7);

//%color("green",0.2) translate([0,0,35]) difference() {
//    cylinder(h=60,d1=50,d2=50);
//    translate([0,0,-0.05]) cylinder(h=60+0.1,d1=44,d2=44);
//}

%color("green",0.2) translate([0,0,36]) {
    cylinder(h=60,d1=44,d2=44);
}
